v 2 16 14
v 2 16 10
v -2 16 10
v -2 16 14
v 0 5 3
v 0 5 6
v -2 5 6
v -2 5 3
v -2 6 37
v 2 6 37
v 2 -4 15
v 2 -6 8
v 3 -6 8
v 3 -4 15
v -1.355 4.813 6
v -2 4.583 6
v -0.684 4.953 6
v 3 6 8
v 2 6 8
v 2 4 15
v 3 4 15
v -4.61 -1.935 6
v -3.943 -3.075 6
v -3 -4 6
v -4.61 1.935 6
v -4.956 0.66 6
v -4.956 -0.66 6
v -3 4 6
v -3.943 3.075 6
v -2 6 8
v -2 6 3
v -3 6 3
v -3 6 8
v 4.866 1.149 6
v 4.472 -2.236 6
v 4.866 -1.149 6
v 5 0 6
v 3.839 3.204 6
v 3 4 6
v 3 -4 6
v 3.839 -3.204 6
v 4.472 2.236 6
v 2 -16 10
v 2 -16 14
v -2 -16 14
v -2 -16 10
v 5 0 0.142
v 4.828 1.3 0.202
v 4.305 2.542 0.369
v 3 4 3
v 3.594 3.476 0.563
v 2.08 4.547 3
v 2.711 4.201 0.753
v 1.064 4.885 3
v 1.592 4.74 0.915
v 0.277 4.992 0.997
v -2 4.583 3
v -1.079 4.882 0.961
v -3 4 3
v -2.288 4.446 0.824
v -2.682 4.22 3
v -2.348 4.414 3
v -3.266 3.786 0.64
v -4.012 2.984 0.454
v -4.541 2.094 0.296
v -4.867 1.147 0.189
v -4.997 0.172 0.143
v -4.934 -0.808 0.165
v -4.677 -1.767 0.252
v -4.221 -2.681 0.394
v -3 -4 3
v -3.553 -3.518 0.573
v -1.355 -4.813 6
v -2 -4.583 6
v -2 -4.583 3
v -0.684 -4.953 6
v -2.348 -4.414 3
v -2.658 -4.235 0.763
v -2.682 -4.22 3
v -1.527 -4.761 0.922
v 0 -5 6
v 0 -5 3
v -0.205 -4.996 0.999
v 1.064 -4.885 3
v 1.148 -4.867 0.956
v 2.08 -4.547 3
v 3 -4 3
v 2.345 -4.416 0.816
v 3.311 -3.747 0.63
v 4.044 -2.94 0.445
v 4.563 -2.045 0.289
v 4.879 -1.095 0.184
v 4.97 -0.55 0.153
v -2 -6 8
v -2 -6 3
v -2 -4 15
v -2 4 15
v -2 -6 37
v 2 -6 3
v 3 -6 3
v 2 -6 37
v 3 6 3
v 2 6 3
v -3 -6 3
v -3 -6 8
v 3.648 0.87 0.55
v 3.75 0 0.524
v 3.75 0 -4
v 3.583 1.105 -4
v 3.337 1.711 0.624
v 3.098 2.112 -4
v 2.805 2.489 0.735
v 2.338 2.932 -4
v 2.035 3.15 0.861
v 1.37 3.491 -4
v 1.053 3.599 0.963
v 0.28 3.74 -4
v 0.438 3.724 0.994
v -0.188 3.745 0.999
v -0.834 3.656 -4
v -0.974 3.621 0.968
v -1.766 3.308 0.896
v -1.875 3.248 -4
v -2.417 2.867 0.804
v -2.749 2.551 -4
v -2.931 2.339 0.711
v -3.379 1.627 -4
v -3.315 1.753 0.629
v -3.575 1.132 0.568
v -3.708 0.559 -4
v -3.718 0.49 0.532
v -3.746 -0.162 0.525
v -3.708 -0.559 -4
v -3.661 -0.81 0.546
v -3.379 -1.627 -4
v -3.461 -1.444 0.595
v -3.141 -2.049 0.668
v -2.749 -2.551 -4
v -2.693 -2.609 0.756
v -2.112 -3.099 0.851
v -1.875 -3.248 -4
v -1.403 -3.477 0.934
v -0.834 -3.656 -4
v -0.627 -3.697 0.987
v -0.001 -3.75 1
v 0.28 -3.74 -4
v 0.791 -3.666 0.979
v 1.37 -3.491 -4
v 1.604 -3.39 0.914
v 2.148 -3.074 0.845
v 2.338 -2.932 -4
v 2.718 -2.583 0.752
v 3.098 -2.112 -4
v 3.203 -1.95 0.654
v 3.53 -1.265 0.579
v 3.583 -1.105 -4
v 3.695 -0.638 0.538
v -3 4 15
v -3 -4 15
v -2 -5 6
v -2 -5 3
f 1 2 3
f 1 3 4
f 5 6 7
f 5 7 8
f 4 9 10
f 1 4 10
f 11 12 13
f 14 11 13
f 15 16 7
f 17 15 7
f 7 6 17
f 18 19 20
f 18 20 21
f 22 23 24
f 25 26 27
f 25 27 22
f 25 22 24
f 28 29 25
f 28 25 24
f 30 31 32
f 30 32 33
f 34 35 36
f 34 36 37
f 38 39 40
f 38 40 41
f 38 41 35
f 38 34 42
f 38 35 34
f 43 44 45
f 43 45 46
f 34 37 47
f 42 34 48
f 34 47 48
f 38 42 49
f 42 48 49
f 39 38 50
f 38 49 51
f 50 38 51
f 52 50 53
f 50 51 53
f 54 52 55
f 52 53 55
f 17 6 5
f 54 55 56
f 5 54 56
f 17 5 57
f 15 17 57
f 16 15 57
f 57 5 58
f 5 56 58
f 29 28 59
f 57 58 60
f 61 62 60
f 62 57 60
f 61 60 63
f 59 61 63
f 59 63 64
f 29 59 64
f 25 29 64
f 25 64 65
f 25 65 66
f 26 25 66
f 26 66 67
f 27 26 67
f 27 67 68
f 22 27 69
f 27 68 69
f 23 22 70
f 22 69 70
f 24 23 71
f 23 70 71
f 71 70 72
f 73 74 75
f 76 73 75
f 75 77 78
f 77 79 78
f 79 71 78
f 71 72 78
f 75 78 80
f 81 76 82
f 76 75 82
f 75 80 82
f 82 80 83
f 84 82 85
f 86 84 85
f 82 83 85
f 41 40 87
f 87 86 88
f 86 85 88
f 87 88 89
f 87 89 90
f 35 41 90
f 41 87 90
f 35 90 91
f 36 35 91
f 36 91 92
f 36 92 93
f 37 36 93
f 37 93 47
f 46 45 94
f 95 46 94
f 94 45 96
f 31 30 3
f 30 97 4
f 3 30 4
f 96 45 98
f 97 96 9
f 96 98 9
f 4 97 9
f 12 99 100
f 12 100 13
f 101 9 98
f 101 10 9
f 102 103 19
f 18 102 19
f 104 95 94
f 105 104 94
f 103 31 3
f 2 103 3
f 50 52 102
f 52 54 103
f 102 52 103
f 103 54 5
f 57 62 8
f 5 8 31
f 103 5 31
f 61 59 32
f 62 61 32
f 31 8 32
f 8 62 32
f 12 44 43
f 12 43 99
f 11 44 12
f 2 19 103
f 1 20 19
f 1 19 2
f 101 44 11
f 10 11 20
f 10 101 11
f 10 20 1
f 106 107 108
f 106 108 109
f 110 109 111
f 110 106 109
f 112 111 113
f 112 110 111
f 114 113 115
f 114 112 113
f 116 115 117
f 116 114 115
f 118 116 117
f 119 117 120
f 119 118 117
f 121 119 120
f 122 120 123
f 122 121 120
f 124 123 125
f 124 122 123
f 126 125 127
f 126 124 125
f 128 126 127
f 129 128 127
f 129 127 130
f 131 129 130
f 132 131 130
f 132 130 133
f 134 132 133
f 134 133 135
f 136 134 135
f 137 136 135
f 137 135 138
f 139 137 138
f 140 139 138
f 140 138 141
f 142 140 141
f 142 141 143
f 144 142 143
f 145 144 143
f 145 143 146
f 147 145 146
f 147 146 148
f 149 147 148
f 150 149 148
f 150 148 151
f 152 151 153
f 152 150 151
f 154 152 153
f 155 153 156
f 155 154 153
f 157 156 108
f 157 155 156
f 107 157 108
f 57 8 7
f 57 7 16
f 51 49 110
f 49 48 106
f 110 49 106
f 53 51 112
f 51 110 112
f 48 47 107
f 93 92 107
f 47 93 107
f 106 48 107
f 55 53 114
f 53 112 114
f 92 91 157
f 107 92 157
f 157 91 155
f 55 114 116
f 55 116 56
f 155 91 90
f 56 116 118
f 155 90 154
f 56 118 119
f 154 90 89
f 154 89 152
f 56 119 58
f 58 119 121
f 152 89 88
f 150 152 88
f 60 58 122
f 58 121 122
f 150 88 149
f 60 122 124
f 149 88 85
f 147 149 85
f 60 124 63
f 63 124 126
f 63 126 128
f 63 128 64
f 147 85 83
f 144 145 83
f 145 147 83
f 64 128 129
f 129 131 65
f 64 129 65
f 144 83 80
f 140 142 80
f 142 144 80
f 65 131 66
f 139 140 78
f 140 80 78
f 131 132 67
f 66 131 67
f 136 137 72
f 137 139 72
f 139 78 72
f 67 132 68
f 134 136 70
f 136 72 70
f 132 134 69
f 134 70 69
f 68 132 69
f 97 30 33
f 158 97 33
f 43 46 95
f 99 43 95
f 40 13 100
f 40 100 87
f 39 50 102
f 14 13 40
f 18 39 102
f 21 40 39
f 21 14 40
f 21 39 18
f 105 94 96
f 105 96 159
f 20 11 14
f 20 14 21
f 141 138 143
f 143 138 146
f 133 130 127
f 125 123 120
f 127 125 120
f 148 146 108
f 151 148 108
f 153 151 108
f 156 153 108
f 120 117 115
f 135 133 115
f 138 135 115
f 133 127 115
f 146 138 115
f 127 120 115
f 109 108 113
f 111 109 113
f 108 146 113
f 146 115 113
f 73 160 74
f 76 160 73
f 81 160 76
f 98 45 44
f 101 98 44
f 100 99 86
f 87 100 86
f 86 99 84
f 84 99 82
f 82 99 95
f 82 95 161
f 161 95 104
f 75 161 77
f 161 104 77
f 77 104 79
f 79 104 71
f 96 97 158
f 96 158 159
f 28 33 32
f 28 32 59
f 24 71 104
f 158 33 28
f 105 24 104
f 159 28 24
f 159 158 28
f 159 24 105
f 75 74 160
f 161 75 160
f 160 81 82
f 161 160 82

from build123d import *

# Parameters (mm, degrees)
F0_R         = 5
F1_DEPTH     = 6
F3_R         = 15
F4_DEPTH     = 25
F5_R         = 3.75
F6_DEPTH     = 10
F8_DEPTH     = 2
F9_DEPTH     = 2
F10_T1_DEPTH = 55.6511992514
F11_T1_DEPTH = 55.6511992514
F12_SIZE2    = 23
F12_SIZE     = 10
F14_W        = 12
F14_H        = 12
F15_DEPTH    = 1
F16_W        = 12
F16_H        = 12
F17_DEPTH    = 1
F18_SIZE2    = 7
F18_SIZE     = 2
F19_SIZE2    = 7
F19_SIZE     = 2


# Not quite as in the source:
# - a fillet or chamfer that OpenCascade refuses, or shapes differently, is made with other operations: its cross-section is extruded or revolved along the edge and cut away or added
# - two fillets or chamfers of one size are made in one step


with BuildPart() as f1:
    # F0 (on Top) → F1 (new body)
    with BuildSketch(Plane.XY):
        Circle(F0_R)
    extrude(amount=F1_DEPTH)

    # F3 (on offset) → F4 (cut)
    with BuildSketch(Plane.XZ.offset(6)):
        with Locations((0, -14)):
            Circle(F3_R)
    extrude(amount=-F4_DEPTH, mode=Mode.SUBTRACT)

    # F5 (on face) → F6 (join)
    with BuildSketch(Plane.XY.offset(6)):
        Circle(F5_R)
    extrude(amount=-F6_DEPTH)

    # F7 (on Right) → F8 (join)
    with BuildSketch(Plane.YZ):
        Polygon((16, 3), (16, 37), (-16, 37), (-16, 3), (0, 3), align=None)
    extrude(amount=F8_DEPTH)

    # F9 (add): a face of the model
    f9_faces = [f1.faces().sort_by_distance(p)[0] for p in [
        (0, 0, 20.4395085066),
    ]]
    extrude(f9_faces, amount=F9_DEPTH)

    # F10: chamfer of 10 x 7 on 1 edges, made by hand

    # F10_s2 → F10_t1 (cut)
    with BuildSketch(Plane.YZ.offset(-27.8255996257)):
        Polygon((-16, 10), (-6, 3), (-16, 3), align=None)
    extrude(amount=F10_T1_DEPTH, mode=Mode.SUBTRACT)

    # F11: chamfer of 7 x 10 on 1 edges, made by hand

    # F11_s2 → F11_t1 (cut)
    with BuildSketch(Plane.YZ.offset(-27.8255996257)):
        Polygon((6, 3), (16, 10), (16, 3), align=None)
    extrude(amount=F11_T1_DEPTH, mode=Mode.SUBTRACT)

    # F12
    f12_edges = [f1.edges().sort_by_distance(p)[0] for p in [
        (0, -16, 37),
        (0, 16, 37),
    ]]
    f12_side = f1.faces().sort_by_distance((0, 0, 37))[0]
    chamfer(f12_edges, length=F12_SIZE, length2=F12_SIZE2, reference=f12_side)

    # F14 (on face) → F15 (join)
    with BuildSketch(Plane(origin=(-2, 0, 0), x_dir=(0, -1, 0), z_dir=(-1, 0, 0))):
        with Locations((0, 9)):
            Rectangle(F14_W, F14_H)
    extrude(amount=F15_DEPTH)

    # F16 (on face) → F17 (join)
    with BuildSketch(Plane.YZ.offset(2)):
        with Locations((0, 9)):
            Rectangle(F16_W, F16_H)
    extrude(amount=F17_DEPTH)

    # F18
    f18_edges = [f1.edges().sort_by_distance(p)[0] for p in [
        (-2.5, -6, 15),
        (-2.5, 6, 15),
    ]]
    f18_side = f1.faces().sort_by_distance((-2.5, 0, 15))[0]
    chamfer(f18_edges, length=F18_SIZE, length2=F18_SIZE2, reference=f18_side)

    # F19
    f19_edges = [f1.edges().sort_by_distance(p)[0] for p in [
        (2.5, 6, 15),
        (2.5, -6, 15),
    ]]
    f19_side = f1.faces().sort_by_distance((2.5, 0, 15))[0]
    chamfer(f19_edges, length=F19_SIZE, length2=F19_SIZE2, reference=f19_side)


solid = f1.part
